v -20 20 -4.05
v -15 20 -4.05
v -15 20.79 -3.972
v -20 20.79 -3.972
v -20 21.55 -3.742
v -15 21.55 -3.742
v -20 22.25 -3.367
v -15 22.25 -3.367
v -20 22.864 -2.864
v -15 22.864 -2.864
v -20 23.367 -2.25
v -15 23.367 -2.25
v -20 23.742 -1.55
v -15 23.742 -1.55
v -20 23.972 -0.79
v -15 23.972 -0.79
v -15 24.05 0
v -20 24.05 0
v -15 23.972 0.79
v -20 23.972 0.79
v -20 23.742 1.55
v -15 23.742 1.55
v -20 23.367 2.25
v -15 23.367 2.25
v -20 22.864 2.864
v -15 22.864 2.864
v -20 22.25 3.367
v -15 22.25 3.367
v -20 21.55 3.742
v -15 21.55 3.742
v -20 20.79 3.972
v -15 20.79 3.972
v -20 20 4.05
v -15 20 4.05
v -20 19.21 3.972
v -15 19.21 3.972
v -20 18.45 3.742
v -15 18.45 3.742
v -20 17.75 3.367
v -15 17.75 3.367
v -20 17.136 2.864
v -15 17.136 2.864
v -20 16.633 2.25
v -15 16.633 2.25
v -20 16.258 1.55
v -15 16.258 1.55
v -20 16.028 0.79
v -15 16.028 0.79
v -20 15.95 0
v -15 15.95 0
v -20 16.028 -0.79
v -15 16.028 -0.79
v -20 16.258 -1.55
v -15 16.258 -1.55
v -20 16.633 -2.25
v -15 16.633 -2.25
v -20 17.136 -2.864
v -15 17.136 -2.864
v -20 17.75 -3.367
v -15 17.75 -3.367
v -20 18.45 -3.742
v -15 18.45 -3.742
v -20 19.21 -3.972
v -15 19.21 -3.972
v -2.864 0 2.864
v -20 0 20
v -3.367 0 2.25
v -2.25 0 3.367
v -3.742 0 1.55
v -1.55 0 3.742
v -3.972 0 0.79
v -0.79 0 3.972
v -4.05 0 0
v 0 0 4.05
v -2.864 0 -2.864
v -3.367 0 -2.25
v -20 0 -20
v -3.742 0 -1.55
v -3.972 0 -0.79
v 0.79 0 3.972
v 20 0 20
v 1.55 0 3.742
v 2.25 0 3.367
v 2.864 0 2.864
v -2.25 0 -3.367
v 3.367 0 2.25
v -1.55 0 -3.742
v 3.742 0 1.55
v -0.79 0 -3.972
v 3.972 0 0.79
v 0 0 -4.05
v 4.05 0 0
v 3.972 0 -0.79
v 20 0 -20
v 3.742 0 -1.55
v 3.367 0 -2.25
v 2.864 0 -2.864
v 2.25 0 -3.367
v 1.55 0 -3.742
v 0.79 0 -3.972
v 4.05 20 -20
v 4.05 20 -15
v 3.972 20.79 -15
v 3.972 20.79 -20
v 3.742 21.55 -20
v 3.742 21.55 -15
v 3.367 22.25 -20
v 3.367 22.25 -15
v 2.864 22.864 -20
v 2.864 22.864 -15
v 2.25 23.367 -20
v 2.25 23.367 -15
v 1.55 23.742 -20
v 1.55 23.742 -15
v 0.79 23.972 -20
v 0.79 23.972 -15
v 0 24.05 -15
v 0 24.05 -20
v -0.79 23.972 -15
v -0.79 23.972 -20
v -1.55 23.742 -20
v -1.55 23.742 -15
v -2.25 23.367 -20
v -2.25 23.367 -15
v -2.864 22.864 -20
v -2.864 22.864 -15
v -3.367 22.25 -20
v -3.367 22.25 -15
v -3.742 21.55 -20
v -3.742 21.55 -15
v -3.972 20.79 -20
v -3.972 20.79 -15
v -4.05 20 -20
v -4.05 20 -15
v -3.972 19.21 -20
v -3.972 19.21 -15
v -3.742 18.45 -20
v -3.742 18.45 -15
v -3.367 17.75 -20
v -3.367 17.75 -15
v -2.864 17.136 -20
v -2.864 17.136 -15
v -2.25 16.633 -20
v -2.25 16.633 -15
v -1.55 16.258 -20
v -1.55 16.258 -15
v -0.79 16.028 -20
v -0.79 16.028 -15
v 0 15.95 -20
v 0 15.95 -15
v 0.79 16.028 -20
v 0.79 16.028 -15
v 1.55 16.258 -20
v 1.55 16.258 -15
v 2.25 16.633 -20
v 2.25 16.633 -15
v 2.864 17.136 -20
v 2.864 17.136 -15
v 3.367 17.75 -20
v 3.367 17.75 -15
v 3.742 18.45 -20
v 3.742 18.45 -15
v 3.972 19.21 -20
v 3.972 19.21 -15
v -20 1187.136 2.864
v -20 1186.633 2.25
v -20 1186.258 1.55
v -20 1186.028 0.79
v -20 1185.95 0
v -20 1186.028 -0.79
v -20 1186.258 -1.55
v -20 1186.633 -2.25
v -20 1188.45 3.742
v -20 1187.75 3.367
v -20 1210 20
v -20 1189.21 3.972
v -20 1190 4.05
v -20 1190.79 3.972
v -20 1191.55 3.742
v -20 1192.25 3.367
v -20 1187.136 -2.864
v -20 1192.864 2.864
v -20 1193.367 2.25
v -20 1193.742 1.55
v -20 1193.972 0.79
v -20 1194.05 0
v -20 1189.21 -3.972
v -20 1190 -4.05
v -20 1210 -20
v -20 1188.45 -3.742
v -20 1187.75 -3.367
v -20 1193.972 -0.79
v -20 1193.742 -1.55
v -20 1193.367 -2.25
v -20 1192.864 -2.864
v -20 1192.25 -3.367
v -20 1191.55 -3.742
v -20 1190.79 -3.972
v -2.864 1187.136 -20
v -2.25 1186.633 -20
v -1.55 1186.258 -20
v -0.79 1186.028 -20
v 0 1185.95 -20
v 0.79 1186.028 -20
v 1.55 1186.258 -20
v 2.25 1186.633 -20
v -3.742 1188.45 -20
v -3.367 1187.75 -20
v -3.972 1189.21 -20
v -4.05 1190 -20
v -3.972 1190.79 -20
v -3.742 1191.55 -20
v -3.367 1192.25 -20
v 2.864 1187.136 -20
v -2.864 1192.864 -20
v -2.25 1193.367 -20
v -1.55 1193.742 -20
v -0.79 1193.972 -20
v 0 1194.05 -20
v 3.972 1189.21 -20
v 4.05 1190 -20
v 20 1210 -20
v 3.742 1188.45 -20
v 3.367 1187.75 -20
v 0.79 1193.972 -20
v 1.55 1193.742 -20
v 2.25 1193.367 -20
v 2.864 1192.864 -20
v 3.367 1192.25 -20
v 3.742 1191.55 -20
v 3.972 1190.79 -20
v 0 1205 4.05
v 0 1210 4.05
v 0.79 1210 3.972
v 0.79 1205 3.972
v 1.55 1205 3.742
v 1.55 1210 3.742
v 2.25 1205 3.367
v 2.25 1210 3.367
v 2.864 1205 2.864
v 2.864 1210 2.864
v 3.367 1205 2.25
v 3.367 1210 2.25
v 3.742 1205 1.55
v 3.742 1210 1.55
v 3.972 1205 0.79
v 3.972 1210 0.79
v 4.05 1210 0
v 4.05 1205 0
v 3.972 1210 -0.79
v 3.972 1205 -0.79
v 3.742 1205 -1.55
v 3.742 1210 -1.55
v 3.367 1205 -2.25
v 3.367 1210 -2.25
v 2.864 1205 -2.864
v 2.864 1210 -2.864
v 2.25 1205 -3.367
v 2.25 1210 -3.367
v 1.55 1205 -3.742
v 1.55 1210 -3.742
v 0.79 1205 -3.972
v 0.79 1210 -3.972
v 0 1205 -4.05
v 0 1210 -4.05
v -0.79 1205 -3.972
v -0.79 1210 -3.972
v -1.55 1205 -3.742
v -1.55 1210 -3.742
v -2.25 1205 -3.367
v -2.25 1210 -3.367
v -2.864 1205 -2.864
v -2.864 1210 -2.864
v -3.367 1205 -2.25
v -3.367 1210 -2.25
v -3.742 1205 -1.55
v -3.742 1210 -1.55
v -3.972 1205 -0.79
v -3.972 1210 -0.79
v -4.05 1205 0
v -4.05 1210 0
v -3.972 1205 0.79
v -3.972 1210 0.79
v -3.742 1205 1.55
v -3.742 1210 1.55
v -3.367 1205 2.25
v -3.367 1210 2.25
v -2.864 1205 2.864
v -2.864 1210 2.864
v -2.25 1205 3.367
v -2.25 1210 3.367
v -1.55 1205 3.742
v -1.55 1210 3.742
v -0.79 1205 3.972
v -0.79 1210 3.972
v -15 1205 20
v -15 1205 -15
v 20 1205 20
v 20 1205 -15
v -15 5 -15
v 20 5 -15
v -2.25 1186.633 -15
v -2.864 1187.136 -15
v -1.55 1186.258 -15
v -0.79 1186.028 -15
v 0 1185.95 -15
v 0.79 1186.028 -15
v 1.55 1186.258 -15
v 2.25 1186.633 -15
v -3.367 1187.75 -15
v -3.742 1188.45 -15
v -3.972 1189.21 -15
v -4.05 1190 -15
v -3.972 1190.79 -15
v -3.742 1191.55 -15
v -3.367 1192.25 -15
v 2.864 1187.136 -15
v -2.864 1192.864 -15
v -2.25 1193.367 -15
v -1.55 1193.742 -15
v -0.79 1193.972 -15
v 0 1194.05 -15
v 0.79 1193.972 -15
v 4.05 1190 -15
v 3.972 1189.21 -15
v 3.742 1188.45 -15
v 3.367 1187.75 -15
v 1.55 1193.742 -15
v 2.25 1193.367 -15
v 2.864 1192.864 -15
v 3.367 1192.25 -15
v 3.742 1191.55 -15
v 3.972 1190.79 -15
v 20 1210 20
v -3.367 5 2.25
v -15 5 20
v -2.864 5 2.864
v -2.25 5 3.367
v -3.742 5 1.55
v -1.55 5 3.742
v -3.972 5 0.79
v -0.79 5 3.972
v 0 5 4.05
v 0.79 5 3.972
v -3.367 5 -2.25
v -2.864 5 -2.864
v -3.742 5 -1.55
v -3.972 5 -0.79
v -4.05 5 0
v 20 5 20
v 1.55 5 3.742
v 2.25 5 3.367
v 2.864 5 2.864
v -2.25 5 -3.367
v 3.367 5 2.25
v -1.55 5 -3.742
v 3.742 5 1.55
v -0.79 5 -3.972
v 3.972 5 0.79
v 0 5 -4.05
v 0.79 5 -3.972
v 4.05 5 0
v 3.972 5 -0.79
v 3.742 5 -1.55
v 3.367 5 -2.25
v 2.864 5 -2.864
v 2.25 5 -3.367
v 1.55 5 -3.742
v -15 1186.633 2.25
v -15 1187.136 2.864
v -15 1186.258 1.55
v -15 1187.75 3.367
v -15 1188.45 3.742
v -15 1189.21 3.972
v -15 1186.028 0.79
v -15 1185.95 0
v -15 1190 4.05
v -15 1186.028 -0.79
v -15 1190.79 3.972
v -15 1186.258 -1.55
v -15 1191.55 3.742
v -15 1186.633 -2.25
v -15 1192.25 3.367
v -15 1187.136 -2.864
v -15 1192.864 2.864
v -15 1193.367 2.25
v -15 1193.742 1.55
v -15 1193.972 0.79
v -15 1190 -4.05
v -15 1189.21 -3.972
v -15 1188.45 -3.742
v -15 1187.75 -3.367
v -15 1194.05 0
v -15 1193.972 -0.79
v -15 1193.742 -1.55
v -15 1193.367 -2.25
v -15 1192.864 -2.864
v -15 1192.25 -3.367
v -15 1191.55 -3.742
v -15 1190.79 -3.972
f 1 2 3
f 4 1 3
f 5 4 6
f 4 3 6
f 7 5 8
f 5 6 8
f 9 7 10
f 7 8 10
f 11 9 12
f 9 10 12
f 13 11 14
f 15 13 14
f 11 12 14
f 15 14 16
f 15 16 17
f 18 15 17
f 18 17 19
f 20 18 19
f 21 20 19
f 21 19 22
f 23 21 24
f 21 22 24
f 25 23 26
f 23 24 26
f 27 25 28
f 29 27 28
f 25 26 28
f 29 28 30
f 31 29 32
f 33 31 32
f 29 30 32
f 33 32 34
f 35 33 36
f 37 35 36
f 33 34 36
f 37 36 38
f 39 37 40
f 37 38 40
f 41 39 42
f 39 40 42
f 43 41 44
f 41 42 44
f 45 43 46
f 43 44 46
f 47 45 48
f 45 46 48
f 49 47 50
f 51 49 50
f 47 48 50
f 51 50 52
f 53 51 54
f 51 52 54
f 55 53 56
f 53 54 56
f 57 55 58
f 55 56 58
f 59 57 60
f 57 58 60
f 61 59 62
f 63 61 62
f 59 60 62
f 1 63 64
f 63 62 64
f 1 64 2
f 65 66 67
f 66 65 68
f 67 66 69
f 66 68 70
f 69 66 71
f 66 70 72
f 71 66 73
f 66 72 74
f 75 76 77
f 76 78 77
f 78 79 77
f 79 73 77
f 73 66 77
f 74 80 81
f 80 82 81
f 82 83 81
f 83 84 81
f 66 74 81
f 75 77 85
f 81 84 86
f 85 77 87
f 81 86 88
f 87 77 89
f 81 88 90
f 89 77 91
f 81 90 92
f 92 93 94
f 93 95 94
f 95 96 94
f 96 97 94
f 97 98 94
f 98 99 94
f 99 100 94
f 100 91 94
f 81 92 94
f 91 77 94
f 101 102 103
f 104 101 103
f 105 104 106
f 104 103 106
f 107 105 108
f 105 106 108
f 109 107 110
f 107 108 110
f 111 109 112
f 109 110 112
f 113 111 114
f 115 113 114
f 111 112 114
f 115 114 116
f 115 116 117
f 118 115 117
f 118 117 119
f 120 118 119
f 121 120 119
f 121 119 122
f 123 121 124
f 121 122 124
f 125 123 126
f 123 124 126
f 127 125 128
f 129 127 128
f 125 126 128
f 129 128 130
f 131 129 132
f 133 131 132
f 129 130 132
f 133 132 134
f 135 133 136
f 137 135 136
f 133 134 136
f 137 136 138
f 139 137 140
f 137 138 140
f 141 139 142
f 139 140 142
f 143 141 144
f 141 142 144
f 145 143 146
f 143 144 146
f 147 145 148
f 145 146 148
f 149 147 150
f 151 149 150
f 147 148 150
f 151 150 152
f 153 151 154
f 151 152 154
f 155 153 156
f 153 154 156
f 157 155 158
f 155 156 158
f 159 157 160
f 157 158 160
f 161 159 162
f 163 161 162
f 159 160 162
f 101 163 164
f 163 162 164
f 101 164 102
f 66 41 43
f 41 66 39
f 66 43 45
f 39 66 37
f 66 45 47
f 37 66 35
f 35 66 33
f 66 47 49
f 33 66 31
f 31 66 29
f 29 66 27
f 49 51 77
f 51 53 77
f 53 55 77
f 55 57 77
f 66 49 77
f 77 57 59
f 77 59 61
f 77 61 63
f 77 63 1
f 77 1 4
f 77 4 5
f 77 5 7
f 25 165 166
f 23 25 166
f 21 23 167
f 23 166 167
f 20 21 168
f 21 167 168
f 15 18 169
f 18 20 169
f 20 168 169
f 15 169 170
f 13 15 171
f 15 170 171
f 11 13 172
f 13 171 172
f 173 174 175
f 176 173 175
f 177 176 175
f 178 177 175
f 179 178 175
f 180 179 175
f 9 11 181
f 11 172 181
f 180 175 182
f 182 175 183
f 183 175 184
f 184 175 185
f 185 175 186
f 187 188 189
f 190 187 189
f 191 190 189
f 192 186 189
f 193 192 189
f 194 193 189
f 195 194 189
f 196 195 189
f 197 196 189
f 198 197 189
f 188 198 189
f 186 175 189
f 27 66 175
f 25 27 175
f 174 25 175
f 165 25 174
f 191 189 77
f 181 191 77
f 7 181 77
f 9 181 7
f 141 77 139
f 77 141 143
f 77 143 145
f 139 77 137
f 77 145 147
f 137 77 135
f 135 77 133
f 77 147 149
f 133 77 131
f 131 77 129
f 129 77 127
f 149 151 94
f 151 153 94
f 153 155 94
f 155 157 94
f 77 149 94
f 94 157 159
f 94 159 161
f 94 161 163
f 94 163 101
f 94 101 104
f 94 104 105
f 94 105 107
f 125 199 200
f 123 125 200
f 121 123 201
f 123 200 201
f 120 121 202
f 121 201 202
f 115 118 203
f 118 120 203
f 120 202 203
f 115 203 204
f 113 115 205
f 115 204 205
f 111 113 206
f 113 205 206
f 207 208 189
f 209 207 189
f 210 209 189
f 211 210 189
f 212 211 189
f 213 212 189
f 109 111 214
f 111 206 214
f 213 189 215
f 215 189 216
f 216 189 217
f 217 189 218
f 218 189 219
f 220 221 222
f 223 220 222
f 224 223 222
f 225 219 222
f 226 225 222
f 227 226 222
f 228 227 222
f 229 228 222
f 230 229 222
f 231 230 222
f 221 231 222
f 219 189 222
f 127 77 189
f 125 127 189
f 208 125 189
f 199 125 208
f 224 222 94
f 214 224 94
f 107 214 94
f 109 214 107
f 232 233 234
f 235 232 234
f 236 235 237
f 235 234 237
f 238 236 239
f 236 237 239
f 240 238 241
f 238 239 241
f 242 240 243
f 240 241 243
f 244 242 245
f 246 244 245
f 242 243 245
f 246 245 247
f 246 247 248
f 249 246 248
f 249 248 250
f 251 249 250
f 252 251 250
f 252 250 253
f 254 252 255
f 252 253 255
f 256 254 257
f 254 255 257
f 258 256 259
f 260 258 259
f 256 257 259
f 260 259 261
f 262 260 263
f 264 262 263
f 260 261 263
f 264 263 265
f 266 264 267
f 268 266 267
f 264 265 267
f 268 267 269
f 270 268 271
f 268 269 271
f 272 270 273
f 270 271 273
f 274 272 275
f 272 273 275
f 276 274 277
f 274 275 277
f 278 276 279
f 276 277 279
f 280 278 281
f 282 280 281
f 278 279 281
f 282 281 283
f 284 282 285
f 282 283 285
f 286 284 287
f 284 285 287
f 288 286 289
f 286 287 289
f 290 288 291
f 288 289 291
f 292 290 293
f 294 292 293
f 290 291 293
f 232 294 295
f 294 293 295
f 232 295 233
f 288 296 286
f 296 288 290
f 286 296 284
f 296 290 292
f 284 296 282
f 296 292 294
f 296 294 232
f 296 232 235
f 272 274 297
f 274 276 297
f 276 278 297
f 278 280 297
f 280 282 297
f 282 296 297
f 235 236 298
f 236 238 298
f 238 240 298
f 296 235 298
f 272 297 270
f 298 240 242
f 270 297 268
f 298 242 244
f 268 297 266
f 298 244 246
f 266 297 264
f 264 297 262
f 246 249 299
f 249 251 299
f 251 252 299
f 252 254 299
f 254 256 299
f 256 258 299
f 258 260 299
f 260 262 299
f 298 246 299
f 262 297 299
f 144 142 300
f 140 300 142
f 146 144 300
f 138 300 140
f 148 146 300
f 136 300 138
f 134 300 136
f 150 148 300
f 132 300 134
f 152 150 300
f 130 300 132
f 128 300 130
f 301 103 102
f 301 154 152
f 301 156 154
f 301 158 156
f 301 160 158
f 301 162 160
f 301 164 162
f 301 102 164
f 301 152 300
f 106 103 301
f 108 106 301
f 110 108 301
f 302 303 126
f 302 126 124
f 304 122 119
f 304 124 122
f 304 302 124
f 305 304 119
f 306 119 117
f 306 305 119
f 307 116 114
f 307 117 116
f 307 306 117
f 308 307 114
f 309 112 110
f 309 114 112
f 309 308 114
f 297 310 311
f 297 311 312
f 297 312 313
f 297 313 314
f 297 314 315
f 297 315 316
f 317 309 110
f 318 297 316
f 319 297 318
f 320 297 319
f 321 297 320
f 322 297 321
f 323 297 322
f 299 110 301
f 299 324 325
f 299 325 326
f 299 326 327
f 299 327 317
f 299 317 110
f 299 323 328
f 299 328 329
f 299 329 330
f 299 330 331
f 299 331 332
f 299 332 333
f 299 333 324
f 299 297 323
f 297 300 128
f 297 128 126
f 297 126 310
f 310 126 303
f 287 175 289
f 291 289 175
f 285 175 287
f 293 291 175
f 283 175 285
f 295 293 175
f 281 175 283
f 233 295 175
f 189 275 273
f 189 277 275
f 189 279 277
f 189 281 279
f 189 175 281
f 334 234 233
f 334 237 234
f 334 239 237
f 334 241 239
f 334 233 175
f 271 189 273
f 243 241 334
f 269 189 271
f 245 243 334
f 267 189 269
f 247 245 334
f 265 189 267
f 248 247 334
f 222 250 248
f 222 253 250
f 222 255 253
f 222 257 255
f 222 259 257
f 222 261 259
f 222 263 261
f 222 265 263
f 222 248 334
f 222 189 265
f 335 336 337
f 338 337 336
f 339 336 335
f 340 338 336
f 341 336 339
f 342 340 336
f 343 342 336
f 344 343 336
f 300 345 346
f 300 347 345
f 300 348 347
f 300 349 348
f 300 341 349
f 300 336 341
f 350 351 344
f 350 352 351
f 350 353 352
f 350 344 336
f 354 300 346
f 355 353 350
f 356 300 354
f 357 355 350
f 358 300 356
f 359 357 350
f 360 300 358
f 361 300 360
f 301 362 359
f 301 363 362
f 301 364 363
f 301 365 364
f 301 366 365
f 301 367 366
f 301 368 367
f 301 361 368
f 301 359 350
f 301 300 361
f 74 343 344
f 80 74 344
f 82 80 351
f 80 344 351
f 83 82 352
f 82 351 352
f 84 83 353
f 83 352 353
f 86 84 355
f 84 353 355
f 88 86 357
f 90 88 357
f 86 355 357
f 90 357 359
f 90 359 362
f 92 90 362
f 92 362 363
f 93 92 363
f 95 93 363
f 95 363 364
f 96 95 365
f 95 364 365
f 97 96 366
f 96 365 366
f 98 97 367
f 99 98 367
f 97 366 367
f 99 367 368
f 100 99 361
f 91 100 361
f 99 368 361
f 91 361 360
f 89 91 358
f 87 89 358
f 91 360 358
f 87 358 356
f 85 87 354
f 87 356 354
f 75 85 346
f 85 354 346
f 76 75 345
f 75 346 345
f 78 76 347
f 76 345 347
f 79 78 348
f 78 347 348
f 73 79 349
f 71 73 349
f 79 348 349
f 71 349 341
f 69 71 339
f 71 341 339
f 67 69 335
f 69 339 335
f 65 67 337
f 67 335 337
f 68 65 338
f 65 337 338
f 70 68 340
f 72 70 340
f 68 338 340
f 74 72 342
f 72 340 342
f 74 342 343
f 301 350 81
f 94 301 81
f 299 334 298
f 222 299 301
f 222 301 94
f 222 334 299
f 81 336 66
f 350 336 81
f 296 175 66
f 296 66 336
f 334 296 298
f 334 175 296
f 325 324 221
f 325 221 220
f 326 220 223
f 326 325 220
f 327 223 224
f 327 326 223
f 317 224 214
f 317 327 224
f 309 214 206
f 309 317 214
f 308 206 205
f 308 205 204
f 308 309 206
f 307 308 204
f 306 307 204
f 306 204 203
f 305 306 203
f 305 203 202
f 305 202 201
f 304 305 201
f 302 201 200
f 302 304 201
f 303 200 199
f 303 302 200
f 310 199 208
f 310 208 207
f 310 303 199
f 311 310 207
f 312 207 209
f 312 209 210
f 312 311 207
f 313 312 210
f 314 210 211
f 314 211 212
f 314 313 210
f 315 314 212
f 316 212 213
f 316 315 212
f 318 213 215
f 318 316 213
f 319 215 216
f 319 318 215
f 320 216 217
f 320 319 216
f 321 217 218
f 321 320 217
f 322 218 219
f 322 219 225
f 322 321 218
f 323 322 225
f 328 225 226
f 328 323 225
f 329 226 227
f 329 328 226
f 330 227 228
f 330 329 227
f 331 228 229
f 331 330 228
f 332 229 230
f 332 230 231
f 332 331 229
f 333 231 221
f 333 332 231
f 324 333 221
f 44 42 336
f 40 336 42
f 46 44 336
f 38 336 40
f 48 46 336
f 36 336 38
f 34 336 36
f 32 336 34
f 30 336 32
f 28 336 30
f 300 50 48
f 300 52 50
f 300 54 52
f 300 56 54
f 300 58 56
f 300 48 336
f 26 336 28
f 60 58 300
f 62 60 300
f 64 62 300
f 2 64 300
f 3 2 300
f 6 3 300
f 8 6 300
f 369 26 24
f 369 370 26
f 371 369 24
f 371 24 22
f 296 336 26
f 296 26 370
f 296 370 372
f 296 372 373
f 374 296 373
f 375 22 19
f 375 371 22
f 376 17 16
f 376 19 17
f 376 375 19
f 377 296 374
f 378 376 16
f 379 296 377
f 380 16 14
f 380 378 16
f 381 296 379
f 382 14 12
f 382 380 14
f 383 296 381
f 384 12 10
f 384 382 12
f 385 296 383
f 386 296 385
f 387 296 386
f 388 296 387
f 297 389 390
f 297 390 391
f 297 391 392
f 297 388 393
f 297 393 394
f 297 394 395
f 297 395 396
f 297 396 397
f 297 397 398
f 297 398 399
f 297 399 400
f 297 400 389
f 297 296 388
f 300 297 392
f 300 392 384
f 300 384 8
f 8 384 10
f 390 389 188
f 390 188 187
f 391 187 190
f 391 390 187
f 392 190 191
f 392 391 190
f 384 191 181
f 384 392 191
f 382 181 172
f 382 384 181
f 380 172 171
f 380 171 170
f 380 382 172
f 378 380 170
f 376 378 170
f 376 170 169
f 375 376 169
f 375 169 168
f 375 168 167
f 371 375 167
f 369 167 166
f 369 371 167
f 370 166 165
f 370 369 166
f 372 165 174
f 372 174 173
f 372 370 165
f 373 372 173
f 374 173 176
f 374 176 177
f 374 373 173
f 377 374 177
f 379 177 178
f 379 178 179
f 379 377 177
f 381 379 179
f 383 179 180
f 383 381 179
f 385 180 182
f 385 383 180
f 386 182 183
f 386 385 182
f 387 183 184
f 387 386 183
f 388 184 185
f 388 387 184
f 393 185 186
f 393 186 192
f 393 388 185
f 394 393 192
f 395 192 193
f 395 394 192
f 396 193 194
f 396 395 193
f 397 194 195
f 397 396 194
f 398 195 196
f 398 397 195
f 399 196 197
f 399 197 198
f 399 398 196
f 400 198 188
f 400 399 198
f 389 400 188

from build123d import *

# Parameters (mm, degrees)
SKETCH_1_W          = 40
SKETCH_1_H          = 40
EXTRUDE_1_DEPTH     = 5
SKETCH_2_R          = 4.05
CUT_EXTRUDE_1_DEPTH = 5
EXTRUDE_2_DEPTH     = 600
EXTRUDE_START       = 5
SKETCH_4_W          = 40
SKETCH_4_H          = 40
SKETCH_4_R          = 4.05
EXTRUDE_3_DEPTH     = 5
SKETCH_5_R          = 4.05
CUT_EXTRUDE_2_DEPTH = 5
SKETCH_6_R          = 4.05
CUT_EXTRUDE_3_DEPTH = 5


with BuildPart() as part:
    # 草图1 → 凸台-拉伸1 (new body)
    with BuildSketch(Plane(origin=(0, 0, 0), x_dir=(1, 0, 0), z_dir=(0, 1, 0))):
        Rectangle(SKETCH_1_W, SKETCH_1_H)
    extrude(amount=EXTRUDE_1_DEPTH)

    # 草图2 → 切除-拉伸1 (cut)
    with BuildSketch(Plane(origin=(0, 5, 0), x_dir=(1, 0, 0), z_dir=(0, 1, 0))):
        with Locations(Location((0, 0, 0), (0, 0, 270))):
            Circle(SKETCH_2_R)
    extrude(amount=-CUT_EXTRUDE_1_DEPTH, mode=Mode.SUBTRACT)

    # 草图3 → 凸台-拉伸2 (add)
    with BuildSketch(Plane(origin=(0, 5, 0), x_dir=(1, 0, 0), z_dir=(0, 1, 0))):
        Polygon((-20, 20), (-20, -20), (-15, -20), (-15, 15), (20, 15), (20, 20), align=None)
    extrude_2 = extrude(amount=EXTRUDE_2_DEPTH)

    # 镜向1: 凸台-拉伸2 across plane
    add(extrude_2.mirror(Plane.ZX.offset(605)))

    # 草图4 → 凸台-拉伸3 (add)
    with BuildSketch(Plane(origin=(0, 1205, 0), x_dir=(1, 0, 0), z_dir=(0, 1, 0)).offset(EXTRUDE_START)):
        Rectangle(SKETCH_4_W, SKETCH_4_H)
        with Locations(Location((0, 0, 0), (0, 0, 270))):
            Circle(SKETCH_4_R, mode=Mode.SUBTRACT)
    extrude(amount=-EXTRUDE_3_DEPTH)

    # 草图5 → 切除-拉伸2 (cut)
    with BuildSketch(Plane.XY.offset(-15)):
        with Locations((0, 20)):
            Circle(SKETCH_5_R)
    cut_extrude_2 = extrude(amount=-CUT_EXTRUDE_2_DEPTH, mode=Mode.SUBTRACT)

    # 镜向2: 切除-拉伸2 across plane
    add(cut_extrude_2.mirror(Plane(origin=(0, 605, 0), x_dir=(0, 0, 1), z_dir=(0, -1, 0))), mode=Mode.SUBTRACT)

    # 草图6 → 切除-拉伸3 (cut)
    with BuildSketch(Plane(origin=(-15, 0, 0), x_dir=(0, 0, -1), z_dir=(1, 0, 0))):
        with Locations((0, 20)):
            Circle(SKETCH_6_R)
    cut_extrude_3 = extrude(amount=-CUT_EXTRUDE_3_DEPTH, mode=Mode.SUBTRACT)

    # 镜向3: 切除-拉伸3 across plane
    add(cut_extrude_3.mirror(Plane(origin=(0, 605, 0), x_dir=(0, 0, 1), z_dir=(0, -1, 0))), mode=Mode.SUBTRACT)


solid = part.part
